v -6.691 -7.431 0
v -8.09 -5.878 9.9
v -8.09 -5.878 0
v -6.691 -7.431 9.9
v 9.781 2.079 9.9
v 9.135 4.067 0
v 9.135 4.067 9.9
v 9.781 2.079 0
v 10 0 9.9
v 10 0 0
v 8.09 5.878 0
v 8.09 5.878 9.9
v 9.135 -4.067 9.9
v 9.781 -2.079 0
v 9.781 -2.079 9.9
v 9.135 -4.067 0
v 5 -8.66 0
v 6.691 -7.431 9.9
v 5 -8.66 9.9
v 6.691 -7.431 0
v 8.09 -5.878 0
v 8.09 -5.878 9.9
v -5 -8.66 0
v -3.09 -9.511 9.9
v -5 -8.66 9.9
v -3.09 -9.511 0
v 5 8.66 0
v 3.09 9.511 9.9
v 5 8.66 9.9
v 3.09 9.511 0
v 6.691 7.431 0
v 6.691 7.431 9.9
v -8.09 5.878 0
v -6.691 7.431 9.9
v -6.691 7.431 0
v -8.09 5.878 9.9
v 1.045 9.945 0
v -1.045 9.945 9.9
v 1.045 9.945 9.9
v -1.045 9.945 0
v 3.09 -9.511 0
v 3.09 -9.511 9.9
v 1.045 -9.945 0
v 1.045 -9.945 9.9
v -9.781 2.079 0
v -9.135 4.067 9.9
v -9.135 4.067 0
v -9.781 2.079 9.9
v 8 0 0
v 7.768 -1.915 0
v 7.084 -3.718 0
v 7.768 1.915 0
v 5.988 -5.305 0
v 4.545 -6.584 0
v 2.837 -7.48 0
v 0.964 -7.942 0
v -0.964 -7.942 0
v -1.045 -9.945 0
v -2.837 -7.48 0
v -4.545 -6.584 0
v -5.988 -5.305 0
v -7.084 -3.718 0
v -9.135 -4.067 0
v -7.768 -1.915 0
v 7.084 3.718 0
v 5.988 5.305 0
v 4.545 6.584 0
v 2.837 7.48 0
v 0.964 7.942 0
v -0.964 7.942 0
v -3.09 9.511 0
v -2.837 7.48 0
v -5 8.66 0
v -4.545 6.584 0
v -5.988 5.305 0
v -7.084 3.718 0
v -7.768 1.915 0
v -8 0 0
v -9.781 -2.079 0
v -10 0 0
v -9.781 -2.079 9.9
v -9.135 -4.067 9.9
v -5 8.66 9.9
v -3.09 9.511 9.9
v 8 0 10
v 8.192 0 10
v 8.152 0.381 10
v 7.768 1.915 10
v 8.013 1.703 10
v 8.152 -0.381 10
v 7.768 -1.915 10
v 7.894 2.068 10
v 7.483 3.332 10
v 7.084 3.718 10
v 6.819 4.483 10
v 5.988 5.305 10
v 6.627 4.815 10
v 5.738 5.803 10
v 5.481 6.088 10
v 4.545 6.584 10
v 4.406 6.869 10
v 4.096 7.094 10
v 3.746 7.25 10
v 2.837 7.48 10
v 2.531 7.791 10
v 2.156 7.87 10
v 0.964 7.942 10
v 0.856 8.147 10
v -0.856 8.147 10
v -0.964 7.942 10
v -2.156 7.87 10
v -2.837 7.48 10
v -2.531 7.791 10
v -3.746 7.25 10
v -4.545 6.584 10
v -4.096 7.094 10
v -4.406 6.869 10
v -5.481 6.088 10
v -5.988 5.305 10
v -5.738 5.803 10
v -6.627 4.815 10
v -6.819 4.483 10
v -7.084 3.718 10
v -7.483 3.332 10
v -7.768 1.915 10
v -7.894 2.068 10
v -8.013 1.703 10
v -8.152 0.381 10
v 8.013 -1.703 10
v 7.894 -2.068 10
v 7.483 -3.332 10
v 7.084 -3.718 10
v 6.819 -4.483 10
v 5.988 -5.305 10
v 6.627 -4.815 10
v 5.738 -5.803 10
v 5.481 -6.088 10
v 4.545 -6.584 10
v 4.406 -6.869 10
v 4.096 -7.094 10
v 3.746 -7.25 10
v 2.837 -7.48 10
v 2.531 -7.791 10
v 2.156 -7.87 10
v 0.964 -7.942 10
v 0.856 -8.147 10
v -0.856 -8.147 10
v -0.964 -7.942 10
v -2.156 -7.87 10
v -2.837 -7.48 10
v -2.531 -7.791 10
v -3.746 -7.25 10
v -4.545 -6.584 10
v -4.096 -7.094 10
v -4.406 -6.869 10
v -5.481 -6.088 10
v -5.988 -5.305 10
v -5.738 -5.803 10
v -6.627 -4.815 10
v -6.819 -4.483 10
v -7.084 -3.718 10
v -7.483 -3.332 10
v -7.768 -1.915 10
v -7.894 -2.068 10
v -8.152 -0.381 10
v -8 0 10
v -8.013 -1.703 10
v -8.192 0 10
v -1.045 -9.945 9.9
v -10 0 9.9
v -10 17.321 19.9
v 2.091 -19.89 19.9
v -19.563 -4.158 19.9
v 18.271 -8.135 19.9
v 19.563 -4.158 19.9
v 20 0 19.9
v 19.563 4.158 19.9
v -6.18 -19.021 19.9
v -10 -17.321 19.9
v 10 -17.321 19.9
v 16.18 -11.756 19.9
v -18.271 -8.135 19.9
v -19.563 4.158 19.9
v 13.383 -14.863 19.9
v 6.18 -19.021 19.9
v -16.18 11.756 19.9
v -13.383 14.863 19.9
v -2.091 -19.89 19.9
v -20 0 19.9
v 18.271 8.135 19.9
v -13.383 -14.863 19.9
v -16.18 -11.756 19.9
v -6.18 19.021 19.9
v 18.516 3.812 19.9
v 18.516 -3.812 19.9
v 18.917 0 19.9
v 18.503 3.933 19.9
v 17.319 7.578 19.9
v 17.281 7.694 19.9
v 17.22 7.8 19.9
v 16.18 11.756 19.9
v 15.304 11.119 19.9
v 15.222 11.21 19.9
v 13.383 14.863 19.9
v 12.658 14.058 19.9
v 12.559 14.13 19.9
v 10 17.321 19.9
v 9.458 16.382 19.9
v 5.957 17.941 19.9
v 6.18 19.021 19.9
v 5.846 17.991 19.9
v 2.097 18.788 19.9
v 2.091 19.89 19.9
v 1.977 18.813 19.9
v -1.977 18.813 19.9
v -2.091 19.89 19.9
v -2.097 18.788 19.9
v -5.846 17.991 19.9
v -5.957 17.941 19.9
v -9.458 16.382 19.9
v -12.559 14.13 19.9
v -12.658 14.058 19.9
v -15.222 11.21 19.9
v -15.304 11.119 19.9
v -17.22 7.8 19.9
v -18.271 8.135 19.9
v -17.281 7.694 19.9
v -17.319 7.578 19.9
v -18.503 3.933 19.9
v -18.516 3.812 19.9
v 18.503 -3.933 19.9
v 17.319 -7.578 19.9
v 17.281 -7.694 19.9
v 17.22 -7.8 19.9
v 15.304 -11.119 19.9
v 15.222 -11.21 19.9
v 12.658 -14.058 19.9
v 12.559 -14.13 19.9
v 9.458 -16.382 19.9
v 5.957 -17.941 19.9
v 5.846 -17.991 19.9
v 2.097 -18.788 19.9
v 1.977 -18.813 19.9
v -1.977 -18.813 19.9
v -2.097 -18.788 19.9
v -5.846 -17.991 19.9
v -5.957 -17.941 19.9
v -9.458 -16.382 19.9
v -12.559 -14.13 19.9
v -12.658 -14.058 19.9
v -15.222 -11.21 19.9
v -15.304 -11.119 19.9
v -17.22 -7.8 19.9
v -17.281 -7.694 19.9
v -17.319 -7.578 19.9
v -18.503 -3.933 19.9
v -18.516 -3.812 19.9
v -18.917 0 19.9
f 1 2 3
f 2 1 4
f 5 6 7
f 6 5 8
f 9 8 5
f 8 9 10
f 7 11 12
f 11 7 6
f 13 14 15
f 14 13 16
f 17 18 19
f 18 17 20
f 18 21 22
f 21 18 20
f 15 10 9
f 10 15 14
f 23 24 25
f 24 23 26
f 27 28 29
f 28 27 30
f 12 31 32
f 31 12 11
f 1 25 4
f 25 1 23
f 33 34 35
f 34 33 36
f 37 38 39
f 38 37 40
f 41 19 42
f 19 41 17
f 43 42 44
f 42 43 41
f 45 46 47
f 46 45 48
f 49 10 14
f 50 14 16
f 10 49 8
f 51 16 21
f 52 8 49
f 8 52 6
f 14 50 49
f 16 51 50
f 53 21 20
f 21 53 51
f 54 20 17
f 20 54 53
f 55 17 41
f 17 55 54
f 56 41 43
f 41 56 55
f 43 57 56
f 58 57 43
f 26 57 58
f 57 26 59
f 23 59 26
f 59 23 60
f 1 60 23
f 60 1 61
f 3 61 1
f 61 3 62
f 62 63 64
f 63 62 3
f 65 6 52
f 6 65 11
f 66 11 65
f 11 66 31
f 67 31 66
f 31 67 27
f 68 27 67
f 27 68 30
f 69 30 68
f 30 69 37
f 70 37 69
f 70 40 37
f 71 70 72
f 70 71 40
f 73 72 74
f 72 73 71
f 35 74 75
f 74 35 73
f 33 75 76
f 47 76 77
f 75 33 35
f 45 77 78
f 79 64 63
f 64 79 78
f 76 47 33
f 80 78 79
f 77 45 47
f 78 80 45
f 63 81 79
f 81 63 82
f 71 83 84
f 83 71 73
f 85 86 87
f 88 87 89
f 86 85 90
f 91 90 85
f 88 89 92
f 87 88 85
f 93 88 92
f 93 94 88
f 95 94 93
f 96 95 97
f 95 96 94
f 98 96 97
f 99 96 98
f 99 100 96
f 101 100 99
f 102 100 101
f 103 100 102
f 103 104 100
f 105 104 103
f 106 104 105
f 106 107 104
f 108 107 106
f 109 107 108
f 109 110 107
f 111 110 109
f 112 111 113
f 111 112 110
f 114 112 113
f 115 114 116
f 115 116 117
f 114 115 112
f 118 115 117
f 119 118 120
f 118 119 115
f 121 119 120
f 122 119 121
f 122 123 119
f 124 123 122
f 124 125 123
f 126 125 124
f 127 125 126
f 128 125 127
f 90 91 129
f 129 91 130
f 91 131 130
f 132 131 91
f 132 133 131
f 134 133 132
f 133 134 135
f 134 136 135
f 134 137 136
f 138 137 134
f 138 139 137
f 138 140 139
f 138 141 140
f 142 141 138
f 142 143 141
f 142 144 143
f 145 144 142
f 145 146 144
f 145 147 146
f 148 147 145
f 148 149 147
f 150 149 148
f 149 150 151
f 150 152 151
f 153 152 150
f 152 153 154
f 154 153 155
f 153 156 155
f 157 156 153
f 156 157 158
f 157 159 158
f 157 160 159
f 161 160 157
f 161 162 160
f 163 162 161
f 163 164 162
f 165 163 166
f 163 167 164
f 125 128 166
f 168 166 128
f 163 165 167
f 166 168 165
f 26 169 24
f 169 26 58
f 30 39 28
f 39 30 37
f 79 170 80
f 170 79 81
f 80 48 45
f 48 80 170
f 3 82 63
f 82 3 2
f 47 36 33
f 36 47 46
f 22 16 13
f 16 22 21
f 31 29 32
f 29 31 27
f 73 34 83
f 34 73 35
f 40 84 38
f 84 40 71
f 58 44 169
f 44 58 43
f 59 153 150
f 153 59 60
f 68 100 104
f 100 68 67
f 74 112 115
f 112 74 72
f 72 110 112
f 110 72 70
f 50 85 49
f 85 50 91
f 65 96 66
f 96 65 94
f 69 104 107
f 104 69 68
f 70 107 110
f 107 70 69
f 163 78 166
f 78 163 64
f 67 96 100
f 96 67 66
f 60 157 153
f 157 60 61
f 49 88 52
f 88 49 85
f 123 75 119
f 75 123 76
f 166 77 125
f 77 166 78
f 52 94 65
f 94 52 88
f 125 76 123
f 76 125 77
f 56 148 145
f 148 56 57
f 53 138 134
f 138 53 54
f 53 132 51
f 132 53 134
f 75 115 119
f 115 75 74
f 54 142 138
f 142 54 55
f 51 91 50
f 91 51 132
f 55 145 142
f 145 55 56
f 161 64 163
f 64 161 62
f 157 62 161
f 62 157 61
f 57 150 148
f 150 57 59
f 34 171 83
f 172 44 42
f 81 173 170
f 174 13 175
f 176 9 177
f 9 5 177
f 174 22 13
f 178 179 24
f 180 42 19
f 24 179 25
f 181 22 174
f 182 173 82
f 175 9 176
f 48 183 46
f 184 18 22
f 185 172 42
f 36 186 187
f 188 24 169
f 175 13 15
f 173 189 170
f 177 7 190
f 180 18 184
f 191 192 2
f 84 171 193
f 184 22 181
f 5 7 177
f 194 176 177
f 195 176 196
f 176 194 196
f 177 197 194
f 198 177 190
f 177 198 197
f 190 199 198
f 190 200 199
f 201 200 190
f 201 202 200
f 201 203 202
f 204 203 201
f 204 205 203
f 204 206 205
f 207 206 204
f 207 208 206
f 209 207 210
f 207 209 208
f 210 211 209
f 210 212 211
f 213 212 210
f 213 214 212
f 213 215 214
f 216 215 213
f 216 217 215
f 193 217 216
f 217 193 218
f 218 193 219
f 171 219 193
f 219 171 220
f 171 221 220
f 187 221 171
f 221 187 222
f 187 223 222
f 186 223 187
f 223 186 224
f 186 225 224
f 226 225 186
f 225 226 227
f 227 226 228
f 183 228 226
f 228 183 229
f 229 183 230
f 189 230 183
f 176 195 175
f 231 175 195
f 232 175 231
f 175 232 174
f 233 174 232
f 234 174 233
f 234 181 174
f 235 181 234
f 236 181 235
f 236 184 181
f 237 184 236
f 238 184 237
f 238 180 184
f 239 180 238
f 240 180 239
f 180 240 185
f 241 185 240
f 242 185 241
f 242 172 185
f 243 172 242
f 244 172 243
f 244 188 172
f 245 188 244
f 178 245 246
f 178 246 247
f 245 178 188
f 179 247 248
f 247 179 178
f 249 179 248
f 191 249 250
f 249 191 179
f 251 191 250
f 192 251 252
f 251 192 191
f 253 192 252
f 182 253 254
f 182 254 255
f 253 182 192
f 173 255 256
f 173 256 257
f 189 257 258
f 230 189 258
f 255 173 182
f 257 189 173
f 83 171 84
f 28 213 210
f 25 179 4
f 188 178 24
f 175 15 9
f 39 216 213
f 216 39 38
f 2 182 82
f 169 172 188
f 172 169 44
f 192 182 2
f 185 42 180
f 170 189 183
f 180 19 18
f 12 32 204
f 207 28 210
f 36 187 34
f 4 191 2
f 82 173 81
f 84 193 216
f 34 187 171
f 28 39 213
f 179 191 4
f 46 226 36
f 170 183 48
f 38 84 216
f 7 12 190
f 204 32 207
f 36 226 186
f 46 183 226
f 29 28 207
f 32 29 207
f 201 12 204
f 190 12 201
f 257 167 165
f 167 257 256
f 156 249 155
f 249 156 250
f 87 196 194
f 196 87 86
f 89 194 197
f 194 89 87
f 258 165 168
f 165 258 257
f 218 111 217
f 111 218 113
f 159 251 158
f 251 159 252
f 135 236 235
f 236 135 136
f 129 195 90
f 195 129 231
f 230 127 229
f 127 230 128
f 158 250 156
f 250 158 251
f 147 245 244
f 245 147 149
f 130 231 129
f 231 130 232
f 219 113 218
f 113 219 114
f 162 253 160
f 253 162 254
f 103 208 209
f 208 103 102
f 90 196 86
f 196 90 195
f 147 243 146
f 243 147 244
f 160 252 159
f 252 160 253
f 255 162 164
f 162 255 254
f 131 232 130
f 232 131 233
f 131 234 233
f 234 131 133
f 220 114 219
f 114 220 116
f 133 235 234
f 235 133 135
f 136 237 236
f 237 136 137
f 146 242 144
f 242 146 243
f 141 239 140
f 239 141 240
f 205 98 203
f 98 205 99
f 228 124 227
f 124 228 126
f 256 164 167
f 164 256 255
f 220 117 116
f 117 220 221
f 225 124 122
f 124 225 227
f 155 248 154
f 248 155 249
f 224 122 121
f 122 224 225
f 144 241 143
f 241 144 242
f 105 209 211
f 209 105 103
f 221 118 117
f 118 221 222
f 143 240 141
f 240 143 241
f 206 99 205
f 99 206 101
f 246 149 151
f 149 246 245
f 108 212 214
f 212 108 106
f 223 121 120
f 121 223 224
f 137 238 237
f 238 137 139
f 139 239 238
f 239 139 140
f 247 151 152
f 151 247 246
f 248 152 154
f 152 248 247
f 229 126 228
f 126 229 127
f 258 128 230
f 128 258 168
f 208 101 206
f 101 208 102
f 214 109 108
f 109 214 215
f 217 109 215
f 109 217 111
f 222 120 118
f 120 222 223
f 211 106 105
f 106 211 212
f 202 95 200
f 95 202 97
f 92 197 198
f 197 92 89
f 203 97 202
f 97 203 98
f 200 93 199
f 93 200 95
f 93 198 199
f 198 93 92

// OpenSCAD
union() {
    difference() {
        cylinder(r=10,h=10);
        translate([0,0,-1]){
            cylinder(r=8,h=12);
        }
    }
    translate([0,0,9.9]){
    difference() {
        cylinder(r1=10,r2=20,h=10);
        translate([0,0,-1]){
            cylinder(r1=7,r2=20,h=12);
        }
    }
    }
}
